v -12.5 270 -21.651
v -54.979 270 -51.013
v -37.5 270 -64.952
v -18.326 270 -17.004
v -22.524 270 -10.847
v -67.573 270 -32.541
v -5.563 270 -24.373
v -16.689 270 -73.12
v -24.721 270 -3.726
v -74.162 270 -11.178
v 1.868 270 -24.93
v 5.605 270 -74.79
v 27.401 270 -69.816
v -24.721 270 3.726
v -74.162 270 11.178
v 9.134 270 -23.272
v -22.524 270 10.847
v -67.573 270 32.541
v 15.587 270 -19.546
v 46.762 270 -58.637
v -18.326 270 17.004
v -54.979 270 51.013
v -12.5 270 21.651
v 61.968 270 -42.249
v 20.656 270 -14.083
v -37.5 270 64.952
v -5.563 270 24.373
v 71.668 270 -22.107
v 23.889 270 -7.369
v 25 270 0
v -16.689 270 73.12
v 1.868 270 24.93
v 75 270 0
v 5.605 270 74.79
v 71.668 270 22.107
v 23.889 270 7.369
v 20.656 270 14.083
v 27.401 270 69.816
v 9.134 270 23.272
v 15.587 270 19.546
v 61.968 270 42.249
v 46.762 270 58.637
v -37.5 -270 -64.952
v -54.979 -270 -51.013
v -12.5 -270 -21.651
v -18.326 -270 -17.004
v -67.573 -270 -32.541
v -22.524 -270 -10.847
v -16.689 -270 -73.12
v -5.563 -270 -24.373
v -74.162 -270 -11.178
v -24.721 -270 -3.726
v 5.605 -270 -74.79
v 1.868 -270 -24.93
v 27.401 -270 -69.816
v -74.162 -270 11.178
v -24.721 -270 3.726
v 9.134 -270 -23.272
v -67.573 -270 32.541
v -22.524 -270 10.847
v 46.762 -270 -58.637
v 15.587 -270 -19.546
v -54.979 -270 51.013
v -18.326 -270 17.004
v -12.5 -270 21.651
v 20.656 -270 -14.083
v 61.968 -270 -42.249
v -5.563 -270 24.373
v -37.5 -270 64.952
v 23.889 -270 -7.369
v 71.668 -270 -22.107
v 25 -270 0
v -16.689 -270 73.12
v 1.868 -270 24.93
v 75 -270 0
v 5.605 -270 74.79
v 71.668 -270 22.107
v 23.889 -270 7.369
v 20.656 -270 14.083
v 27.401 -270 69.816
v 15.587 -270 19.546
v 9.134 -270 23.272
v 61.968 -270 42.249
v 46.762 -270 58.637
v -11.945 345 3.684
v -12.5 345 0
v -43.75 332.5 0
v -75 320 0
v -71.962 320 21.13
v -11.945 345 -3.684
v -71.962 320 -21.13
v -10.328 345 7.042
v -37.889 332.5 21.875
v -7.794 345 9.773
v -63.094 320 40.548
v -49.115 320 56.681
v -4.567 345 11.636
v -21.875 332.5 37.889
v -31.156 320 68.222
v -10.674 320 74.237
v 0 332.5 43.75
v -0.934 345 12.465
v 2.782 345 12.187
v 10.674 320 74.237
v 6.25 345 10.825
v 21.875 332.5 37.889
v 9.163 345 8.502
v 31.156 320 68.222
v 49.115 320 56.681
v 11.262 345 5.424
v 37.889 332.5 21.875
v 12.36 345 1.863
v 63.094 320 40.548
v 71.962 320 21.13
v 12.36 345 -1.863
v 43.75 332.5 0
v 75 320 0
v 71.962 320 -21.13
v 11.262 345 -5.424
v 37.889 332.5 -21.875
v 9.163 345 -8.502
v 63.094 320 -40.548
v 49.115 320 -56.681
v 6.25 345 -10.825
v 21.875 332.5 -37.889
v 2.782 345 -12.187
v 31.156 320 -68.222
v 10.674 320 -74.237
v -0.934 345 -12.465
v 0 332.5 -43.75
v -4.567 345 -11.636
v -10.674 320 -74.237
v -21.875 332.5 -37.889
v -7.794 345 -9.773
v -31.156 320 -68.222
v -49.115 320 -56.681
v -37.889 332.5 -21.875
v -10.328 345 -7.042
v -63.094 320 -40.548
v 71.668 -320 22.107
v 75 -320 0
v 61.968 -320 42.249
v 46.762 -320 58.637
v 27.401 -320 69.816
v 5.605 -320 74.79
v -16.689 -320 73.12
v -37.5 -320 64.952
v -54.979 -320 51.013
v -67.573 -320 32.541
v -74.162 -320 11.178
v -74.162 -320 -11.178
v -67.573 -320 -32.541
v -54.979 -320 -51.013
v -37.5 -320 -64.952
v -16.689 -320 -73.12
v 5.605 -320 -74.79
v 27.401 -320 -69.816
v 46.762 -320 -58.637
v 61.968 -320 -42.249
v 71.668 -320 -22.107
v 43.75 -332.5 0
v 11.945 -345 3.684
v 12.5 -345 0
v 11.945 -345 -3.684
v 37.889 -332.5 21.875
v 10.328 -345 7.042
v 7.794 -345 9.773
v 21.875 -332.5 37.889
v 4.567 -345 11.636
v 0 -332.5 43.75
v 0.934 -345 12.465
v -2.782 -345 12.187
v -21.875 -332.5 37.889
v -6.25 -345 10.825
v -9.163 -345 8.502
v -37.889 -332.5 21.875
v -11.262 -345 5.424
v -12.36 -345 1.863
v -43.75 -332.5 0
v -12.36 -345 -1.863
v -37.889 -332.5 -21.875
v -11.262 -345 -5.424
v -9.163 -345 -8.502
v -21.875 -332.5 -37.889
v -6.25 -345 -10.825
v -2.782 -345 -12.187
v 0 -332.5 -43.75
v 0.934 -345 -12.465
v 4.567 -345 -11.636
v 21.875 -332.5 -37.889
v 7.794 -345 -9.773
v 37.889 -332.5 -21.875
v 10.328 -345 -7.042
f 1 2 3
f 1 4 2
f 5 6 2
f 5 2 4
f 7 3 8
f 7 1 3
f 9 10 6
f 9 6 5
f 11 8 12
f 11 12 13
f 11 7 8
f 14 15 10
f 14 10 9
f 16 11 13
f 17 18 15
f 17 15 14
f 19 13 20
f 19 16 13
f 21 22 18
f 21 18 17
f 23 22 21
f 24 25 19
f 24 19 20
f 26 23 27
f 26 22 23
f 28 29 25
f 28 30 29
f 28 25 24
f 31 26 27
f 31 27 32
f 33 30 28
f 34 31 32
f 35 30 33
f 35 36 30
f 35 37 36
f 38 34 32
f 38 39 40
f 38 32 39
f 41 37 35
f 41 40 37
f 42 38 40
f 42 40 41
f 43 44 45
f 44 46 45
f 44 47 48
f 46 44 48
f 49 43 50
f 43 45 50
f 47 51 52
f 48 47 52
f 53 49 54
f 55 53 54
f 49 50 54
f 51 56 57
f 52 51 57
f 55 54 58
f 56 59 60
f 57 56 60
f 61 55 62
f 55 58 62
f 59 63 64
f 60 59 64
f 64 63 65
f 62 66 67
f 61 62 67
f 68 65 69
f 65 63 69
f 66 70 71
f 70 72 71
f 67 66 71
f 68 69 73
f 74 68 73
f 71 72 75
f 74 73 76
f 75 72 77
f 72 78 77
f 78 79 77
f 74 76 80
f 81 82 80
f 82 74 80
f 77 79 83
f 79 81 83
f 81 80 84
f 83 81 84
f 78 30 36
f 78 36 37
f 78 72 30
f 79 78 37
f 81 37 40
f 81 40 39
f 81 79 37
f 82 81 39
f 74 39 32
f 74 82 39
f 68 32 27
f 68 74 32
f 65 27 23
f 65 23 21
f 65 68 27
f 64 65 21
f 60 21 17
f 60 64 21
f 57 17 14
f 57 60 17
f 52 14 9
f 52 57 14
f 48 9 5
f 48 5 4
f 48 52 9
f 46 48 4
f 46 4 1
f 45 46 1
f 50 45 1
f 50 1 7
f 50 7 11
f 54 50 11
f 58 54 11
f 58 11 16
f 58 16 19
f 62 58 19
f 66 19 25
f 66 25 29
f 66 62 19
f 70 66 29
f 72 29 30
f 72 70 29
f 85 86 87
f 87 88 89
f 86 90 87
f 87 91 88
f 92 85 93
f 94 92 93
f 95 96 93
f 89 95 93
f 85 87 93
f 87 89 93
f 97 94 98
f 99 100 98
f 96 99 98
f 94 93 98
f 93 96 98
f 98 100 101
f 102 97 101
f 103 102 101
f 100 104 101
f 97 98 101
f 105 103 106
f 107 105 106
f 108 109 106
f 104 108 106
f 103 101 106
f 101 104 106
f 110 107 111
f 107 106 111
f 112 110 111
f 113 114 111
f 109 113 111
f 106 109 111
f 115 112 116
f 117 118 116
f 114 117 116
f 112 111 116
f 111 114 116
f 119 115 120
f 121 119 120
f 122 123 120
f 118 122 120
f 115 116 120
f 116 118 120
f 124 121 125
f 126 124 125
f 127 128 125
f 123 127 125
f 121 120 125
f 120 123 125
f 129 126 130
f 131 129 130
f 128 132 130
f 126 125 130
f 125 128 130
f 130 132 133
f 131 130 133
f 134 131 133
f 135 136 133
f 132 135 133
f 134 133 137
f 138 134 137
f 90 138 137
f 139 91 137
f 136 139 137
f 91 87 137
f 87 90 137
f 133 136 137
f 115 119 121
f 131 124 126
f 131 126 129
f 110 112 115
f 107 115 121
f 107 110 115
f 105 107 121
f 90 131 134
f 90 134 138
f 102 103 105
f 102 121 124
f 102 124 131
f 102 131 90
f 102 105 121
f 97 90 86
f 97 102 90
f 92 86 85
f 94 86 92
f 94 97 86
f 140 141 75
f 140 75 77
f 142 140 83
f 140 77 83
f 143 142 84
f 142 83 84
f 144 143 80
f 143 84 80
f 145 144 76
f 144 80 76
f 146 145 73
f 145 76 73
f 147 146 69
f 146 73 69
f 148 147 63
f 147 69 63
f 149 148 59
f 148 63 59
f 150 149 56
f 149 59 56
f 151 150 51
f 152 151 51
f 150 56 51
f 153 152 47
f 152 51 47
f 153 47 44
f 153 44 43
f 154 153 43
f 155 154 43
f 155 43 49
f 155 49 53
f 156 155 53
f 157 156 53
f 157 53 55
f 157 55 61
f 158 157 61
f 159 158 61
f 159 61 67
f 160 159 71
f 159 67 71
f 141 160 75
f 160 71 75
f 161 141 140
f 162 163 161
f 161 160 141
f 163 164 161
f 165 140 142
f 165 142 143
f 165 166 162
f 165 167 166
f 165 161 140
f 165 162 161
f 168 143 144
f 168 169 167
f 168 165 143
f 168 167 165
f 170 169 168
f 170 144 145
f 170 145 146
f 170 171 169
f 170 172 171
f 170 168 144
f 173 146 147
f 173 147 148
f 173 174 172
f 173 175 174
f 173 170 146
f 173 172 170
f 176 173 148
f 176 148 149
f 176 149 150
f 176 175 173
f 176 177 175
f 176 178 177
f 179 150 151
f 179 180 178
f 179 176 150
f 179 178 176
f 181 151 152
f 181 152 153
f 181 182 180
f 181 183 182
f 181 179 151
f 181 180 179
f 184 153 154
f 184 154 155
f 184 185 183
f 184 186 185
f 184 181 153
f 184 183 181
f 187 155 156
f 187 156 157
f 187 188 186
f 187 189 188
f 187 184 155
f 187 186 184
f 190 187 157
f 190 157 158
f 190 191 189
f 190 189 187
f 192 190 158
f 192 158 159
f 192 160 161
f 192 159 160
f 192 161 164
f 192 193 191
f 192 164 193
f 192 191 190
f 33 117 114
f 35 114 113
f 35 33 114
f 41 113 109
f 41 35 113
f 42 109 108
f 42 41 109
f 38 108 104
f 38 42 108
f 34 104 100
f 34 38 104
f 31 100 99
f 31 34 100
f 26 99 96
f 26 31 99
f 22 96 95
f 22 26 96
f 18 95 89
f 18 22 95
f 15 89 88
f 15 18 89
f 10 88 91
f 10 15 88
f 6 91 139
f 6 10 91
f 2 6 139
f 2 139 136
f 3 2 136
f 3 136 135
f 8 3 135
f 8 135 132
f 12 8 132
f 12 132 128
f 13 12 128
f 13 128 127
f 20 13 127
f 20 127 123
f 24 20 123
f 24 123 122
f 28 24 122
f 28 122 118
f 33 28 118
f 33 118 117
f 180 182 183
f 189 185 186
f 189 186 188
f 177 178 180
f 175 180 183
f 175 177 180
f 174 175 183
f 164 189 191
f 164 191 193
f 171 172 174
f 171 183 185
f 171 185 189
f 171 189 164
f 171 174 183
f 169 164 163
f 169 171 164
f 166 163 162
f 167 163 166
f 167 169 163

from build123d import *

# Parameters (mm, degrees)
F0_R      = 25
F1_DEPTH  = 270
F2_R      = 75
F3_DEPTH  = 50
F3_FACE_R = 75
F6_R      = 12.5
F9_R      = 12.5
F4_FACE_R = 75


with BuildPart() as f1:
    # F0 (on Front) → F1 (new body)
    with BuildSketch(Plane.XZ):
        Circle(F0_R)
    extrude(amount=F1_DEPTH)

    # F2 (on face) → F3 (join)
    with BuildSketch(Plane.XZ.offset(270)):
        Circle(F2_R)
    extrude(amount=F3_DEPTH)

    # F4: F1 across plane


with BuildPart() as f1_1:
    add(f1.part)
    add(f1.part.mirror(Plane.XZ))

    # F3_face (on face) → F7 section 0
    with BuildSketch(Plane.XZ.offset(320)):
        Circle(F3_FACE_R)
    # F6 (on offset) → F7 section 1
    with BuildSketch(Plane.XZ.offset(345)):
        Circle(F6_R)
    loft()

    # F9 (on offset) → F10 section 0
    with BuildSketch(Plane(origin=(0, 345, 0), x_dir=(-1, 0, 0), z_dir=(0, 1, 0))):
        Circle(F9_R)
    # F4_face (on face) → F10 section 1
    with BuildSketch(Plane(origin=(0, 320, 0), x_dir=(-1, 0, 0), z_dir=(0, 1, 0))):
        Circle(F4_FACE_R)
    loft()


solid = f1_1.part
